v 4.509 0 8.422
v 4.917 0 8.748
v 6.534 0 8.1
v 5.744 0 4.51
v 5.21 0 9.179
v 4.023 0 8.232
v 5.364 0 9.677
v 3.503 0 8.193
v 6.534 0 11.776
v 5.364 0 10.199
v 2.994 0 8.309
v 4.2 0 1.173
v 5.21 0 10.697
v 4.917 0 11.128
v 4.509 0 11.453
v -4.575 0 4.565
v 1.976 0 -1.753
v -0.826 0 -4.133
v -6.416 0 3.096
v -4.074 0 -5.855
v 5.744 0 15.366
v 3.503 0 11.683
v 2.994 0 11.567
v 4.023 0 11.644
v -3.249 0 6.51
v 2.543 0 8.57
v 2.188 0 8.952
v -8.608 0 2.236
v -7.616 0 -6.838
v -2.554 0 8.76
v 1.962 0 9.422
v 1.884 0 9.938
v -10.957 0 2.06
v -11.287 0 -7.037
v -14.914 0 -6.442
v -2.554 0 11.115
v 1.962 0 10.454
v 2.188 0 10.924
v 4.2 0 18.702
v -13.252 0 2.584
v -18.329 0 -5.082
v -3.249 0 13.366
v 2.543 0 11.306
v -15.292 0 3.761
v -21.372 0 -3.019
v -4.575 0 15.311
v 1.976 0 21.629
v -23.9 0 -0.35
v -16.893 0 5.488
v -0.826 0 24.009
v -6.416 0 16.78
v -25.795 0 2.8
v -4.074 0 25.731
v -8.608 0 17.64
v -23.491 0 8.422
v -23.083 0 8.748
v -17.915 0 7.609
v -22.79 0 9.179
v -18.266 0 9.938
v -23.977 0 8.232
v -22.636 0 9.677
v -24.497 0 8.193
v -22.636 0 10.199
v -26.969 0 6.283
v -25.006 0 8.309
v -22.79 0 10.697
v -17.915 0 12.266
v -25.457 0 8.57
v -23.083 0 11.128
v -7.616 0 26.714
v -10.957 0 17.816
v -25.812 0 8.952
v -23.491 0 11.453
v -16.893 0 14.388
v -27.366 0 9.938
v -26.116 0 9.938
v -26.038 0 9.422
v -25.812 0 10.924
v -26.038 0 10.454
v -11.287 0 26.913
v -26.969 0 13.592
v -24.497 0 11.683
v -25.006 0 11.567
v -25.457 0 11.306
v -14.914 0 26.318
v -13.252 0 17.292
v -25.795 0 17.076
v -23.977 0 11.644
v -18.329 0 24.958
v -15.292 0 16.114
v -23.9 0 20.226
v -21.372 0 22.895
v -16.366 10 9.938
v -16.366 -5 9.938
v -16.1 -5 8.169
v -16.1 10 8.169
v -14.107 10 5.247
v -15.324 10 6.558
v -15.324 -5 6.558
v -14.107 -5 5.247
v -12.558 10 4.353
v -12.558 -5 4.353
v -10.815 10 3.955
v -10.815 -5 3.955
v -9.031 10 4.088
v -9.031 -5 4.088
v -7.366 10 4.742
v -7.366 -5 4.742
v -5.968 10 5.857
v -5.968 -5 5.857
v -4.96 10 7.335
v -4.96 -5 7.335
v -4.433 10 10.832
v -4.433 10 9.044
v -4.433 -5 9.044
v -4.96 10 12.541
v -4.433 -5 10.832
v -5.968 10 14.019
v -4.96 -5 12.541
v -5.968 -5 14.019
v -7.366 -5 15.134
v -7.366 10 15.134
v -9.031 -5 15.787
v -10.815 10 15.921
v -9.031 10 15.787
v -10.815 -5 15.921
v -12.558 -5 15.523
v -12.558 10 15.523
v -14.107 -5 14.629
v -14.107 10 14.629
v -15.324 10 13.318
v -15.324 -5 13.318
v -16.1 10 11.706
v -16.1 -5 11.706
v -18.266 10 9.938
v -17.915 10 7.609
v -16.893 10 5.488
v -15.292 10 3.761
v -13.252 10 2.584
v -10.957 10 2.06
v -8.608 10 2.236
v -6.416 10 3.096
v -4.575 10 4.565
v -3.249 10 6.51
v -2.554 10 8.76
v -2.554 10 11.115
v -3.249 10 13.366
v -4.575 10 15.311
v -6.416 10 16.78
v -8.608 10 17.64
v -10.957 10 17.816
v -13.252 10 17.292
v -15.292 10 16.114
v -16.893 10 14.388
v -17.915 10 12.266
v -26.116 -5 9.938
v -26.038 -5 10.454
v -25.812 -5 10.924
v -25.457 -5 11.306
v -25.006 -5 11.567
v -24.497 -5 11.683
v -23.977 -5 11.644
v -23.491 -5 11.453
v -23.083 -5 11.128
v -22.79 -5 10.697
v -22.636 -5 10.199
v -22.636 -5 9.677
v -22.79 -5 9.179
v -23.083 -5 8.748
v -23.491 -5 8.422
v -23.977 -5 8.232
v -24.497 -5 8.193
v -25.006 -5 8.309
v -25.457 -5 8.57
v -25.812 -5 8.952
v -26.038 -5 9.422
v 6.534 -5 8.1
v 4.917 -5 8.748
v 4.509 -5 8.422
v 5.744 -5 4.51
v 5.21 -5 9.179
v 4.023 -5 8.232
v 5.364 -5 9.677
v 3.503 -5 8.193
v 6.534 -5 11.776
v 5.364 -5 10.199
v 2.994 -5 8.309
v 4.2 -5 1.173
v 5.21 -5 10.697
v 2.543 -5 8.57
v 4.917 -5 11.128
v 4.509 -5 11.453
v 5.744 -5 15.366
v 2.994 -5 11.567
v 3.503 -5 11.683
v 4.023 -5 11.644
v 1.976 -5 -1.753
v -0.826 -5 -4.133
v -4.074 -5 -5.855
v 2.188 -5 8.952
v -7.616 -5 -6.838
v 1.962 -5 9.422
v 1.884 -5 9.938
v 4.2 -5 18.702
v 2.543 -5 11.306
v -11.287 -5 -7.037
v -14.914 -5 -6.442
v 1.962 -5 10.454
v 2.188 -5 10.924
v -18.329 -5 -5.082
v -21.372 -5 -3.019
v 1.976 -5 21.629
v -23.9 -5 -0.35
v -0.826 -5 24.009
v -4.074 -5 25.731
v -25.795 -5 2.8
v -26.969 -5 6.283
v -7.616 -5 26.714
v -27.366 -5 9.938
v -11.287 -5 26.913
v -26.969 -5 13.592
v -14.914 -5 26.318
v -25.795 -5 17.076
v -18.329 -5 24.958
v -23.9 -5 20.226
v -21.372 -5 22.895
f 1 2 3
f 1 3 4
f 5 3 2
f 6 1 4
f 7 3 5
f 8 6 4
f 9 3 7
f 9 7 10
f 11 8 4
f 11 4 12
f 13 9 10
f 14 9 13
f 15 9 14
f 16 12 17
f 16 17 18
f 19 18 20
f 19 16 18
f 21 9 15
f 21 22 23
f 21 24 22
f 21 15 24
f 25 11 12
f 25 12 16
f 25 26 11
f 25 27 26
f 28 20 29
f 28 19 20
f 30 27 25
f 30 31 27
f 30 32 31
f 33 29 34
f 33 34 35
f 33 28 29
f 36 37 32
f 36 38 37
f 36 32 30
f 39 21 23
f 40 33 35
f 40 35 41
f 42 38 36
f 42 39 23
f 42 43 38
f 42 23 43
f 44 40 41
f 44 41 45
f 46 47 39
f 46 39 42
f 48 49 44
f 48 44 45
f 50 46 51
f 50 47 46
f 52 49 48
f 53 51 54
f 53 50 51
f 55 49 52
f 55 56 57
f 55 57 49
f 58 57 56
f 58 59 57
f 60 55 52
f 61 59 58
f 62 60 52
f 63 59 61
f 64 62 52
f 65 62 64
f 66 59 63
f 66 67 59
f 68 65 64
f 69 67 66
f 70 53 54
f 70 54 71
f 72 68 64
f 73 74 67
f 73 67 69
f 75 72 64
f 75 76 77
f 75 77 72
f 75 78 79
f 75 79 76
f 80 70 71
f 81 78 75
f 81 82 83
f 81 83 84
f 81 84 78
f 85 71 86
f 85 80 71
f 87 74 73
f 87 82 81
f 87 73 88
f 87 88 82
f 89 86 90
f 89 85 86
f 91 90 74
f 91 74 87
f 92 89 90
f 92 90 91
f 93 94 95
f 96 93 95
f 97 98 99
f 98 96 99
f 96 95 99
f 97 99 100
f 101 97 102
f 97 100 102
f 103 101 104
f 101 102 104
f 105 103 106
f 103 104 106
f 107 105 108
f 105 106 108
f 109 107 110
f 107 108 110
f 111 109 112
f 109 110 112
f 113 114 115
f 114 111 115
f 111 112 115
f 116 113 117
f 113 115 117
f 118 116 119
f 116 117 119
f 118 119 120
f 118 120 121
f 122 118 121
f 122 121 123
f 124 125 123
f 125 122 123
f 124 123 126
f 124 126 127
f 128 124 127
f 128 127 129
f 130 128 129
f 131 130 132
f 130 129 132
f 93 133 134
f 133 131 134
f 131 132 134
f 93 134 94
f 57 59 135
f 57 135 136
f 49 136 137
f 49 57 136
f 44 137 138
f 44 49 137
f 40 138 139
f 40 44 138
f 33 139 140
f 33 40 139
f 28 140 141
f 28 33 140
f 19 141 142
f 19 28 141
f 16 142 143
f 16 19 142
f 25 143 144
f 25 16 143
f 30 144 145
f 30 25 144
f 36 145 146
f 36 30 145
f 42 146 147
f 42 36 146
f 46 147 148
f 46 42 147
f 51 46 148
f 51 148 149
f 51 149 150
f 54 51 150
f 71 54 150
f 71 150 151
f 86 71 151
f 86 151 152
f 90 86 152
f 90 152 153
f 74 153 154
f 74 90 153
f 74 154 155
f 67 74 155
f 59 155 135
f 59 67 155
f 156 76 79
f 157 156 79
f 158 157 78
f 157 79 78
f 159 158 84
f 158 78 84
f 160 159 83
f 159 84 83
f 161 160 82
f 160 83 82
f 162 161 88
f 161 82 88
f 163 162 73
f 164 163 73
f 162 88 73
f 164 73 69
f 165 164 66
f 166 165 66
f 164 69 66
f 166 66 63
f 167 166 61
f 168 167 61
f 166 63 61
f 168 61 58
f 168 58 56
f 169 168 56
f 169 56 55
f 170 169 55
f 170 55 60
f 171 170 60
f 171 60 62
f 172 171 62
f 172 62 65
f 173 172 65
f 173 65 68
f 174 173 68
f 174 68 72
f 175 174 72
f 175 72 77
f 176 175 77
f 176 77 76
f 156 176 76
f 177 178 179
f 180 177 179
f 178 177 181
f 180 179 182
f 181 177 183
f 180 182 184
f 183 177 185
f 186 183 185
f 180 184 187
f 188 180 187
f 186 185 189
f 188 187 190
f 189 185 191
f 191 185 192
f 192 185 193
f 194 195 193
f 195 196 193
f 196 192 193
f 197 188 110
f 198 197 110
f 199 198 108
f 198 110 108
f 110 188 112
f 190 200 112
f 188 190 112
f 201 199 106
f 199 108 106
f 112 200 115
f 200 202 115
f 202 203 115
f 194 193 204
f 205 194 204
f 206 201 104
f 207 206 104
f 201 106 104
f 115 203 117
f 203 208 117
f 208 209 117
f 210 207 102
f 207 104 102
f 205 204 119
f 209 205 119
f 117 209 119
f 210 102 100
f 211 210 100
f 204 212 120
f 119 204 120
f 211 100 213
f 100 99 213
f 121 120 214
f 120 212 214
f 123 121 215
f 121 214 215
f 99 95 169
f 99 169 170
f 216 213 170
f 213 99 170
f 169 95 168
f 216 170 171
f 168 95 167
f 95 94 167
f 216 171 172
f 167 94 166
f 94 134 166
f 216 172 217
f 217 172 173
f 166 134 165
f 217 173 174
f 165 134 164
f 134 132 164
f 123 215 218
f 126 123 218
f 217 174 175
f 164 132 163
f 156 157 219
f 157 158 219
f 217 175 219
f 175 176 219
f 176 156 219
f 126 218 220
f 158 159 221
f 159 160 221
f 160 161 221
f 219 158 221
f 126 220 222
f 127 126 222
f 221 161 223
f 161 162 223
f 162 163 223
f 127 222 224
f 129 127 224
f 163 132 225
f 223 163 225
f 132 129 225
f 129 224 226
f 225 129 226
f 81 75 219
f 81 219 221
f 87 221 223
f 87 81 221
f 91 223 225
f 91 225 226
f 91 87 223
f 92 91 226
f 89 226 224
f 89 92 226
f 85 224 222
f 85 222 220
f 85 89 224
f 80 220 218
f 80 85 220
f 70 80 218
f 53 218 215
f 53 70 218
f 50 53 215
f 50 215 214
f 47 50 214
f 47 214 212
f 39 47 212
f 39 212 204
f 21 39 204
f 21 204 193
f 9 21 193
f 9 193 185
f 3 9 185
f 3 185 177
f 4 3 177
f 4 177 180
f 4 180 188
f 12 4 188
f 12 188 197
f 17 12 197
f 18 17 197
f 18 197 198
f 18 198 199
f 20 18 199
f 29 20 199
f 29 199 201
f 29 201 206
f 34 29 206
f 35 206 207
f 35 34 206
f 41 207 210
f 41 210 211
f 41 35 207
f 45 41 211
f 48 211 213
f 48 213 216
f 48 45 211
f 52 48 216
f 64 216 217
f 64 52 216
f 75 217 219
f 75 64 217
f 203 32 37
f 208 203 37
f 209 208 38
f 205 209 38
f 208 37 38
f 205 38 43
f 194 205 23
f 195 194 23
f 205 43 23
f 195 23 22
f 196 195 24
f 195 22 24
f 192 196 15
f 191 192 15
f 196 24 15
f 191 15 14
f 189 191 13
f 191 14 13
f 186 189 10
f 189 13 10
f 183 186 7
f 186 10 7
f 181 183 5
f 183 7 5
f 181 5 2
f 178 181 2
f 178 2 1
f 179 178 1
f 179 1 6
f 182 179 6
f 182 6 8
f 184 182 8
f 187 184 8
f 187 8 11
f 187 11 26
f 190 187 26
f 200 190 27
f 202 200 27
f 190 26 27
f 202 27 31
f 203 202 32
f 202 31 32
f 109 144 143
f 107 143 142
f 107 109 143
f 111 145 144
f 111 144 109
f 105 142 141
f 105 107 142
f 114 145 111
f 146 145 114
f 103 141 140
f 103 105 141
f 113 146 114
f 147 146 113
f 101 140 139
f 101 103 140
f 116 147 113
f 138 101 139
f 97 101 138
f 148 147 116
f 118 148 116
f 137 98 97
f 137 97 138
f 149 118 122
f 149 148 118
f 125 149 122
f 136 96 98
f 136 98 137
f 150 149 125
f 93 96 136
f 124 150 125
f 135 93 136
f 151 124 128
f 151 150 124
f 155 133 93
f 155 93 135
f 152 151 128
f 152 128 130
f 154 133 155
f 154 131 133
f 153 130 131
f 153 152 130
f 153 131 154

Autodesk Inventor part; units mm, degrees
ref_plane "YZ Plane" through (0, 0, 0) normal (1, 0, 0) x (0, 1, 0)
ref_plane "XZ Plane" through (0, 0, 0) normal (0, 1, 0) x (-1, 0, 0)
ref_plane "XY Plane" through (0, 0, 0) normal (0, 0, 1) x (1, 0, 0)
sketch "Boceto1" plane through (0, 0, 0) normal (0, 1, 0) x (-1, 0, 0)
  circle A0 centre (10.3662, 9.9379) radius 6
  circle A1 centre (10.3662, 9.9379) radius 7.9
  circle A2 centre (10.3662, 9.9379) radius 17
  line L0 (18.2662, 9.9379) -> (22.6162, 9.9379)
  line L1 (2.4662, 9.9379) -> (-1.8838, 9.9379)
  line L2 (22.6162, 9.9379) -> (24.3662, 9.9379)
  line L3 (-1.8838, 9.9379) -> (-3.6338, 9.9379)
  circle A3 centre (24.3662, 9.9379) radius 1.75
  circle A4 centre (-3.6338, 9.9379) radius 1.75
  dimension "d0" = 12
  dimension "d1" = 15.8
  dimension "d35" = 34
  dimension "d40" = 14
  dimension "d41" = 14
extrude "Extrusión6" add sketch "Boceto1" along normal blind 10 contours A1
extrude "Extrusión8" add sketch "Boceto1" against normal blind 5 contours A1 | A2
thread "Thread3" size "M12x1.5" class "6H" standard "ISO Metric profile" length 40
properties part number "Tuerca de mesa" material "Brass, Soft Yellow"
